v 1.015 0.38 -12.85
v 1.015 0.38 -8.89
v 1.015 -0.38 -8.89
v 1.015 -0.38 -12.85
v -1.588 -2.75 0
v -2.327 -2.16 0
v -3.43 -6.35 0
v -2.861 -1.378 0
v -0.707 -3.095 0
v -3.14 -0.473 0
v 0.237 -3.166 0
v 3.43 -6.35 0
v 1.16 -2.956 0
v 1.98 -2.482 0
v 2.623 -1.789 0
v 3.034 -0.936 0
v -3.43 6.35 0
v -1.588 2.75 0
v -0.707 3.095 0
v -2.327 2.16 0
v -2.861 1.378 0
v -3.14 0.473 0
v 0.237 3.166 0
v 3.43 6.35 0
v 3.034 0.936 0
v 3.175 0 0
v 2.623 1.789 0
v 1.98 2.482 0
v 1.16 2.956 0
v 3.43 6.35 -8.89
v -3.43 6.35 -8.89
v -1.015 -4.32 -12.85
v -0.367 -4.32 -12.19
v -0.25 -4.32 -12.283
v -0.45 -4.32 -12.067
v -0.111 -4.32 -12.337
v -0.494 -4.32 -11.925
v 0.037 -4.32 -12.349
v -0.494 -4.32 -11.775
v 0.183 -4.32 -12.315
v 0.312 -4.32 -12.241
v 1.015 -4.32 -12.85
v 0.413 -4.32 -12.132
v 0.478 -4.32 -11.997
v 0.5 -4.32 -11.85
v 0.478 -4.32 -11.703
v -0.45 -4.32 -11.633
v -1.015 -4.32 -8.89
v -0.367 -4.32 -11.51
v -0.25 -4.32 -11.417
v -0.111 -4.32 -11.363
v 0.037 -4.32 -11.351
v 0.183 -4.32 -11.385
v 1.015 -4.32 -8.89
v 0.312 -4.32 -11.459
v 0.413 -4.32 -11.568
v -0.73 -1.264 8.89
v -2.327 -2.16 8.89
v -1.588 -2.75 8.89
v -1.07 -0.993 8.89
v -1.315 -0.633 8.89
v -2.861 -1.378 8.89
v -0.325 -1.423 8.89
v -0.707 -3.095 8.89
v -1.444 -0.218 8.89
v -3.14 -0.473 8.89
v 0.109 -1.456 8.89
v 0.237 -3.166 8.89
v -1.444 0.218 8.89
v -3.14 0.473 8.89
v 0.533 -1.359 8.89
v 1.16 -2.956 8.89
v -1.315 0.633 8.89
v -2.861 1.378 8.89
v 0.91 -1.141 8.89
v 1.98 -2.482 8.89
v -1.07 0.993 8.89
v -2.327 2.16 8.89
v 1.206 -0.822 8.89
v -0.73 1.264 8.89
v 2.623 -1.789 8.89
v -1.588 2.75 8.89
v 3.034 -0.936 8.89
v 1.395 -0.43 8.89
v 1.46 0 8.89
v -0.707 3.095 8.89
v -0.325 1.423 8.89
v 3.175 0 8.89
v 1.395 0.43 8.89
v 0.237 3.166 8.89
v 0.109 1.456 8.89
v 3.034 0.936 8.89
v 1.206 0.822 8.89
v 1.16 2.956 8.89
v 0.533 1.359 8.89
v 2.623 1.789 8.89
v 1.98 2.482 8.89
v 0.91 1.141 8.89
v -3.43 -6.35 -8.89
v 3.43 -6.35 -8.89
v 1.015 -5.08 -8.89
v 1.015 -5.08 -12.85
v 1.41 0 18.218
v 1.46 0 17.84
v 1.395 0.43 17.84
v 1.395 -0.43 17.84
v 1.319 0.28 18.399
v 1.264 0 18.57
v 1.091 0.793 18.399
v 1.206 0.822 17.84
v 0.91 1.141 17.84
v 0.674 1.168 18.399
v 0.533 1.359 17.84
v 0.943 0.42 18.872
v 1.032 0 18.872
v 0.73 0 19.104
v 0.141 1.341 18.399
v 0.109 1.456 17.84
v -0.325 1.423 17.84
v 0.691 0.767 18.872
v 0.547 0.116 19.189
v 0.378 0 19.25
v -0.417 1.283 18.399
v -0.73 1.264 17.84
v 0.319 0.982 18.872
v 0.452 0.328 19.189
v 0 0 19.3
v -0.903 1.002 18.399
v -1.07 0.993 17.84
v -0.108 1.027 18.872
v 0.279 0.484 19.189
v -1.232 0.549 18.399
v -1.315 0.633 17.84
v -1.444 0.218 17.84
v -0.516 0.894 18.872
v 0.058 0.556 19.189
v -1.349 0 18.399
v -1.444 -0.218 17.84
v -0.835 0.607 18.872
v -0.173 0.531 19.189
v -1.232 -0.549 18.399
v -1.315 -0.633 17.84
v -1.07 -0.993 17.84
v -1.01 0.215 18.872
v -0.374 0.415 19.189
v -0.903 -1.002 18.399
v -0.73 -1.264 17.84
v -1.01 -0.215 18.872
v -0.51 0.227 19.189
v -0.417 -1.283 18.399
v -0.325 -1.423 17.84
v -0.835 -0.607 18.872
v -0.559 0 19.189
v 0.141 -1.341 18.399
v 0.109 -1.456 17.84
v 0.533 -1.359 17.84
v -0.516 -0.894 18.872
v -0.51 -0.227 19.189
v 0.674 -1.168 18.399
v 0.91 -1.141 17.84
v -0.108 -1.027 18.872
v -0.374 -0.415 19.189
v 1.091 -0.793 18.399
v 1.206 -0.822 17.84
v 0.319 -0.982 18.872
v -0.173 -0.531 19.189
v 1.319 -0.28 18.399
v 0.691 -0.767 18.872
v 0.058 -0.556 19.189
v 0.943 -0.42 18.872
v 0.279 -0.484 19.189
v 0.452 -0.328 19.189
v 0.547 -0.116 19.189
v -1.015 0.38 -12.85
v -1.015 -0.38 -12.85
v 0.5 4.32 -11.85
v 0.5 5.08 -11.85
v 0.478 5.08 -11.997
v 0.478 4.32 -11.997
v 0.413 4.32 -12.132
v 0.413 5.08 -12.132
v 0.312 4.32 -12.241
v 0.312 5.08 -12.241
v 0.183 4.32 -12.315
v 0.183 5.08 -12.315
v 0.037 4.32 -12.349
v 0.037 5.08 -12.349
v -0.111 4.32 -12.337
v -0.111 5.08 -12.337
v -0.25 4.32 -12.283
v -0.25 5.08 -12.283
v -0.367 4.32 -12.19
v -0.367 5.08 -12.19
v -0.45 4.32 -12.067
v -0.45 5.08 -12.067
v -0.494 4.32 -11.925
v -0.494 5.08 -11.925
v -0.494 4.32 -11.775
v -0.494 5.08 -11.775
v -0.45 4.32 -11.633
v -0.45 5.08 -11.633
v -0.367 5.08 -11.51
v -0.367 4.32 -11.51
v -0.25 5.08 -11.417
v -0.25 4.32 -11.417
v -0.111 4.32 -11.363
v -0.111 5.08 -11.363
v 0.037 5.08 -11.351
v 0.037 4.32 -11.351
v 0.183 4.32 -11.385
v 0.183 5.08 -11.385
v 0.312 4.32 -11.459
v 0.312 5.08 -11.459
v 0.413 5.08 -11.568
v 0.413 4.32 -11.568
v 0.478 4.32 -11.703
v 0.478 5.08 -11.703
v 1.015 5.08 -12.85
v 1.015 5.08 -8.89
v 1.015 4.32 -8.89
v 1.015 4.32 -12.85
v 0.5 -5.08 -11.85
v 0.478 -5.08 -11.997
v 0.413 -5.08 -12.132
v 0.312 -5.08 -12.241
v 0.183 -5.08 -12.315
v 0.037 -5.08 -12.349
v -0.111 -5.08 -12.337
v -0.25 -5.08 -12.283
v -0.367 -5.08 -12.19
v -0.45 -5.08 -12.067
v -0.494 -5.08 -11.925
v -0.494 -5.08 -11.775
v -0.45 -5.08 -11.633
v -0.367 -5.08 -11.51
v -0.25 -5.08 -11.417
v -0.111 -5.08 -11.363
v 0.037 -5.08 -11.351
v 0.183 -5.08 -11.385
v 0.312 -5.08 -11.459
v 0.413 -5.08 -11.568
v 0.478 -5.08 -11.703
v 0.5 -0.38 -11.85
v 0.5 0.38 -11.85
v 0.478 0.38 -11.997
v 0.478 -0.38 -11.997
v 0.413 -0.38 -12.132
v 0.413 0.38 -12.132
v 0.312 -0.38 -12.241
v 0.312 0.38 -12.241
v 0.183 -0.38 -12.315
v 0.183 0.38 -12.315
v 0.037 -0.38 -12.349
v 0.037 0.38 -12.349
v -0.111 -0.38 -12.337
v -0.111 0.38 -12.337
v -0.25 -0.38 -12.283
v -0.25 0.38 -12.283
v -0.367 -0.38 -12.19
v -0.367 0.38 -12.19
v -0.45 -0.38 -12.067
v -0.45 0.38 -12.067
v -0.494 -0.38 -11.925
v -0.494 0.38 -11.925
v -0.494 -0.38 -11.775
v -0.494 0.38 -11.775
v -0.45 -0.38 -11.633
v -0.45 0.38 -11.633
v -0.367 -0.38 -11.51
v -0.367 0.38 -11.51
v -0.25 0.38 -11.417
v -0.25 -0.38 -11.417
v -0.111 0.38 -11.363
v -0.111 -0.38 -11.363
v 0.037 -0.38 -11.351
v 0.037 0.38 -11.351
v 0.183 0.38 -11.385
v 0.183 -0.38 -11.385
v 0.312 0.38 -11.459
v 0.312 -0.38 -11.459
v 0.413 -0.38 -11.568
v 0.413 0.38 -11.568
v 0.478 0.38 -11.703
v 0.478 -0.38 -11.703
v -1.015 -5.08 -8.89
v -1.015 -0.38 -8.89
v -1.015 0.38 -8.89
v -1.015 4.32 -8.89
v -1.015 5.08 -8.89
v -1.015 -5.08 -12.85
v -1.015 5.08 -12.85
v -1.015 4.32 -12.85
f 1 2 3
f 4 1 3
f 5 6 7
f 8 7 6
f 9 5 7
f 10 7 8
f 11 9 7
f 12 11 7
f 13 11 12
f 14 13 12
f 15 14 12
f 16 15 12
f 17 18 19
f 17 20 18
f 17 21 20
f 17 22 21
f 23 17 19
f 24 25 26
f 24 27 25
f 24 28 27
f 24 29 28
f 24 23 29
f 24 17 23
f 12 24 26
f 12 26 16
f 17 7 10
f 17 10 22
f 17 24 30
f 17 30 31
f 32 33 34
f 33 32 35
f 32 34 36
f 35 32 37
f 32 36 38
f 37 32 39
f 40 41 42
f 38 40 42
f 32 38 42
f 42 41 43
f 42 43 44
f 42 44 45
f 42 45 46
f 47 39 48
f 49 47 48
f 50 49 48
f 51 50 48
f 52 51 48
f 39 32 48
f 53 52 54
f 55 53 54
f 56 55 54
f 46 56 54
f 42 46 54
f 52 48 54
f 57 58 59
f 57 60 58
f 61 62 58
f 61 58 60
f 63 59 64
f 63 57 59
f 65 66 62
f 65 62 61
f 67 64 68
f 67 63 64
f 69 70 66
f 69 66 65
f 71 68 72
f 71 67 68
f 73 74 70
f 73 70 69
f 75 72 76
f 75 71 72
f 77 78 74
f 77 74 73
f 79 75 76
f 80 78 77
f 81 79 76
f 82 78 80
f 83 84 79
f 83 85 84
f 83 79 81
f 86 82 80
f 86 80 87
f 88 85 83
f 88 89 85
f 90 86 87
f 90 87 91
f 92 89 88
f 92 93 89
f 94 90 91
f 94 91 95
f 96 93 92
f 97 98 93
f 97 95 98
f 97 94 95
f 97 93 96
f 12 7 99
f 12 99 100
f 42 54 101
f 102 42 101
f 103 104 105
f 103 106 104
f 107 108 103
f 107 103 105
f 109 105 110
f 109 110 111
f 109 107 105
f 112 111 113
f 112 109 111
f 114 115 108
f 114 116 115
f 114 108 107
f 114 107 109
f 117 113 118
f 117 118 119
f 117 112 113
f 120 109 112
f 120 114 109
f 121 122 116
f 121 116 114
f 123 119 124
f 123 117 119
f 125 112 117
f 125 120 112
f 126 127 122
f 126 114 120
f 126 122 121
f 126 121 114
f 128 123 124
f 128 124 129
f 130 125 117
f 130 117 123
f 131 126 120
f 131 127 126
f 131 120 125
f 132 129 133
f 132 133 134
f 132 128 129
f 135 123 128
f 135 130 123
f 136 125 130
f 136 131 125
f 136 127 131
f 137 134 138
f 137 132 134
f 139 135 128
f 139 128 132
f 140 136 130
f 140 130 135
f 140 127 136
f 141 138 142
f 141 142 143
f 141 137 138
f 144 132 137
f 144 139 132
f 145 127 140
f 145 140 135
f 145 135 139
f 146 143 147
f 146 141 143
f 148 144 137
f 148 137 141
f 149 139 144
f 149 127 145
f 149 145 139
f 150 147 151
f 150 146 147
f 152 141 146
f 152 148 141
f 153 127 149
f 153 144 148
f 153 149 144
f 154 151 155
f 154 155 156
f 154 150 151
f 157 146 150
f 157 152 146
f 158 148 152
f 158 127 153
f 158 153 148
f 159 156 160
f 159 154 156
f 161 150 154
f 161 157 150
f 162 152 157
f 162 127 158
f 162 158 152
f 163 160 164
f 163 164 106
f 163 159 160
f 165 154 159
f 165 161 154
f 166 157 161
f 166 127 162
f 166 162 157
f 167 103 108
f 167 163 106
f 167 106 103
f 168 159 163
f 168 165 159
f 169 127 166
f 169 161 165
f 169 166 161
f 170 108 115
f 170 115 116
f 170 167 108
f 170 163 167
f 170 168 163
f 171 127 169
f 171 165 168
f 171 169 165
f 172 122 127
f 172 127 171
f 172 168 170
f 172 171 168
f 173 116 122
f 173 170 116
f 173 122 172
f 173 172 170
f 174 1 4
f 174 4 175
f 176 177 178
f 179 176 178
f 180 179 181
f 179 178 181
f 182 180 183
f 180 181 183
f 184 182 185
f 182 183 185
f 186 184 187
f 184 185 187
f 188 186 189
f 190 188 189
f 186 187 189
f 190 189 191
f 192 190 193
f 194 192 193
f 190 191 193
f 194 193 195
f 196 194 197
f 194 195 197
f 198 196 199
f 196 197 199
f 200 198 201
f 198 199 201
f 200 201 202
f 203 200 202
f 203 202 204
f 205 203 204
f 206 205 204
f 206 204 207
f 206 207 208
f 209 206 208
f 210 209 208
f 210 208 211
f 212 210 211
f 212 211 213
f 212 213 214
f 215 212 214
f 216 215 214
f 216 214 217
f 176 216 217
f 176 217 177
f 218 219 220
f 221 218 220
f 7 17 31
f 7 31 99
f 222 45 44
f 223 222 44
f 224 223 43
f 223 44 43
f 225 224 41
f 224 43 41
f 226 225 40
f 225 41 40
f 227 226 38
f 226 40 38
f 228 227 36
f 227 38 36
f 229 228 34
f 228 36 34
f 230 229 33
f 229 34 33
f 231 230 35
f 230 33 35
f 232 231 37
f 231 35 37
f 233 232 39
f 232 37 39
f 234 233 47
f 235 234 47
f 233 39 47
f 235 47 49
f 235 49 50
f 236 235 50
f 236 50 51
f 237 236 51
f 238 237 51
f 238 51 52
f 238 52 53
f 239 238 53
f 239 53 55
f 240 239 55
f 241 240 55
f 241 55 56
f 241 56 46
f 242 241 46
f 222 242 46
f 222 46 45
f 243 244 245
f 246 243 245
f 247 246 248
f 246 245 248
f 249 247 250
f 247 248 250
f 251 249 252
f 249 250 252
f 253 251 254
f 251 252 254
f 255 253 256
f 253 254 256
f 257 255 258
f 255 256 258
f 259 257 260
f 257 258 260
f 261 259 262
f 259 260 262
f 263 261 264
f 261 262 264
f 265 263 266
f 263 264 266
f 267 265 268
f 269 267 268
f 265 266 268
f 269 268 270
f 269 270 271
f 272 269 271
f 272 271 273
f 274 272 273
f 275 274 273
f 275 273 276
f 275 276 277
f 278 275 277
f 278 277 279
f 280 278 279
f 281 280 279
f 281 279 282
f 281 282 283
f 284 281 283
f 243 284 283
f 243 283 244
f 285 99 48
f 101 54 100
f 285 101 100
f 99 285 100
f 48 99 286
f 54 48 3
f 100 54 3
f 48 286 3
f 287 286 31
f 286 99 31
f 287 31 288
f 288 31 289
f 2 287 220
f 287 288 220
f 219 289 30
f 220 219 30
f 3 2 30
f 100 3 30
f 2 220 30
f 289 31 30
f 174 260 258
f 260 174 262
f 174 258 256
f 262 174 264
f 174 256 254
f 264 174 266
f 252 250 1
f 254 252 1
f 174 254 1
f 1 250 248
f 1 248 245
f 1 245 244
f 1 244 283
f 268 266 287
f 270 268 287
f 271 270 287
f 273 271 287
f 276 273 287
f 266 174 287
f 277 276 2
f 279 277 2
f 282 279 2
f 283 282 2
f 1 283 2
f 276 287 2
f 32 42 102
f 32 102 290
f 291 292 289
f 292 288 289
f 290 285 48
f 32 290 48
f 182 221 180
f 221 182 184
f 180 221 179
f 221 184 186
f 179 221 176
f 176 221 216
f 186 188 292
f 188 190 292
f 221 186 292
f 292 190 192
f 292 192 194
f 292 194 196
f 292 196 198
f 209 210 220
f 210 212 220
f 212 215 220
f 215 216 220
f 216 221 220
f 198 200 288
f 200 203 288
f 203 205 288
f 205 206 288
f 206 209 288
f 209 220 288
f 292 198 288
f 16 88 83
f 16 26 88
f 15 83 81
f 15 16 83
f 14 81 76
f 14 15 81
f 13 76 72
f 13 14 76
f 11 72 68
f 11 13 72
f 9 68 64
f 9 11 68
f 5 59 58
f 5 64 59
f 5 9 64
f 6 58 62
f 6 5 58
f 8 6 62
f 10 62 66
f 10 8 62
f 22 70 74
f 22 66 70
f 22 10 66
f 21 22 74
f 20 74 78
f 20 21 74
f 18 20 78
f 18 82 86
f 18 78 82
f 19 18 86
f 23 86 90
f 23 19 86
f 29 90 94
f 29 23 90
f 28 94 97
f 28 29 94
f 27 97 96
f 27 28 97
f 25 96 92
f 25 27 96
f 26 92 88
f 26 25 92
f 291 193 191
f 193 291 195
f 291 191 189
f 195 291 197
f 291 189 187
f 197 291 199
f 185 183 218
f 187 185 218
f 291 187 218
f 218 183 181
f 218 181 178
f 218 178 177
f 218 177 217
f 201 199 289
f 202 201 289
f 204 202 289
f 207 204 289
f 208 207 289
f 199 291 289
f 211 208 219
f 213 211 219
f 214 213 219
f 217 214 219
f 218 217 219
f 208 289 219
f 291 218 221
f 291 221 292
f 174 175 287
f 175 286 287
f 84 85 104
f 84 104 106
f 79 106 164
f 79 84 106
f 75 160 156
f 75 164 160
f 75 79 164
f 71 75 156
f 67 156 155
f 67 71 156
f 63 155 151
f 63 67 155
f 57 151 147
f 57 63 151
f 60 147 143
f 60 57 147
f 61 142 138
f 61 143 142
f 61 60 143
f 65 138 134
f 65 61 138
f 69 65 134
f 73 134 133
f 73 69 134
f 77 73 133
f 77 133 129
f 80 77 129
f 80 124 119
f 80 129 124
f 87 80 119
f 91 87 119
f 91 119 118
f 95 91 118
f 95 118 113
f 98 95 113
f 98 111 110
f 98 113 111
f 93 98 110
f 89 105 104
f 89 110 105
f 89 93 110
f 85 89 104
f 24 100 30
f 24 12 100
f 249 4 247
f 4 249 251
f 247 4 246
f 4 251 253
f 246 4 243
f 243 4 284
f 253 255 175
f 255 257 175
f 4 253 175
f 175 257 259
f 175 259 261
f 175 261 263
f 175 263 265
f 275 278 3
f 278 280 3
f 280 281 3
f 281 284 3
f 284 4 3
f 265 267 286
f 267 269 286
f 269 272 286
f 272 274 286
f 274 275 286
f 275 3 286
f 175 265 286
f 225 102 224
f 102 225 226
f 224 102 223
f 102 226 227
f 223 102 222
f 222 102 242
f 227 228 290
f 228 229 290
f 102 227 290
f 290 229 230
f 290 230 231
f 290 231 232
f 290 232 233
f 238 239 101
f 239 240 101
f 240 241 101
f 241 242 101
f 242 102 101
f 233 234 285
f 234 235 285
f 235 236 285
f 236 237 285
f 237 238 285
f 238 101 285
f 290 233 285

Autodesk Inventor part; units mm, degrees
ref_plane "YZ Plane" through (0, 0, 0) normal (1, 0, 0) x (0, 1, 0)
ref_plane "XZ Plane" through (0, 0, 0) normal (0, 1, 0) x (-1, 0, 0)
ref_plane "XY Plane" through (0, 0, 0) normal (0, 0, 1) x (1, 0, 0)
sketch "Sketch1" plane through (0, 0, 0) normal (0, 0, 1) x (1, 0, 0)
  line L0 (-3.43, -6.35) -> (3.43, -6.35)
  line L1 (3.43, -6.35) -> (3.43, 6.35)
  line L2 (3.43, 6.35) -> (-3.43, 6.35)
  line L3 (-3.43, 6.35) -> (-3.43, -6.35)
  line L4 (-3.43, -6.35) -> (3.43, 6.35) construction
  line L5 (3.43, -6.35) -> (-3.43, 6.35) construction
  point P0 (0, 0)
  dimension "d0" = 6.86
  dimension "d1" = 12.7
extrude "Extrusion1" add sketch "Sketch1" against normal blind 8.89
sketch "Sketch2" plane through (0, 0, 0) normal (0, 0, 1) x (1, 0, 0)
  circle A0 centre (0, 0) radius 3.175
  dimension "d35" = 6.35
extrude "Extrusion2" add sketch "Sketch2" along normal blind 8.89
sketch "Sketch3" plane through (0, 0, -8.89) normal (0, 0, -1) x (-1, 0, 0)
  line L0 (-1.015, -0.38) -> (1.015, -0.38)
  line L1 (1.015, -0.38) -> (1.015, 0.38)
  line L2 (1.015, 0.38) -> (-1.015, 0.38)
  line L3 (-1.015, 0.38) -> (-1.015, -0.38)
  line L4 (-1.015, -0.38) -> (1.015, 0.38) construction
  line L5 (1.015, -0.38) -> (-1.015, 0.38) construction
  line L6 (-1.015, -5.08) -> (1.015, -5.08)
  line L7 (1.015, -5.08) -> (1.015, -4.32)
  line L8 (1.015, -4.32) -> (-1.015, -4.32)
  line L9 (-1.015, -4.32) -> (-1.015, -5.08)
  line L10 (-1.015, -5.08) -> (1.015, -4.32) construction
  line L11 (1.015, -5.08) -> (-1.015, -4.32) construction
  line L12 (-1.015, -9.78) -> (1.015, -9.78) construction
  line L13 (1.015, -9.78) -> (1.015, -9.02) construction
  line L14 (1.015, -9.02) -> (-1.015, -9.02) construction
  line L15 (-1.015, -9.02) -> (-1.015, -9.78) construction
  line L16 (-1.015, -9.78) -> (1.015, -9.02) construction
  line L17 (1.015, -9.78) -> (-1.015, -9.02) construction
  line L18 (-1.015, 4.32) -> (1.015, 4.32)
  line L19 (1.015, 4.32) -> (1.015, 5.08)
  line L20 (1.015, 5.08) -> (-1.015, 5.08)
  line L21 (-1.015, 5.08) -> (-1.015, 4.32)
  line L22 (-1.015, 4.32) -> (1.015, 5.08) construction
  line L23 (1.015, 4.32) -> (-1.015, 5.08) construction
  point P0 (0, 0)
  point P1 (0, 4.7)
  dimension "d6" = 2.03
  dimension "d7" = 0.76
  dimension "d10" = 4.7
  dimension "d17" = 4.7
extrude "Extrusion3" add sketch "Sketch3" along normal blind 3.96
sketch "Sketch4" plane through (-1.015, 5.08, -8.89) normal (0, 1, 0) x (1, 0, 0)
  line L0 (2.03, 0) -> (2.03, 3.96) projected
  line L1 (0, 3.96) -> (2.03, 3.96) projected
  circle A0 centre (1.015, 2.96) radius 0.5
  point P0 (1.015, -8.89)
  dimension "d24" = 1
  dimension "d25" = 1
  dimension "d26" = 1.015
extrude "Extrusion4" cut sketch "Sketch4" against normal through all
sketch "Sketch6" plane through (0, 0, 8.89) normal (0, 0, 1) x (1, 0, 0)
  circle A0 centre (0, 0) radius 1.46
  circle A1 centre (0, 0) radius 3.175 projected
  dimension "d29" = 2.92
extrude "Extrusion5" add sketch "Sketch6" along normal blind 10.41 contours A0
fillet "Fillet1" radius 1.46 1 edges at (-1.46, 0, 19.3)
thread "Thread1" size "1/4-20 UNC" class "2A" standard "ANSI Unified Screw Threads" full length
sketch "Sketch7" plane through (-1.015, -5.08, -8.89) normal (0, -1, 0) x (1, 0, 0)
  circle A0 centre (1.015, -2.96) radius 0.5 projected
sketch "Sketch8" plane through (-1.015, -0.38, -8.89) normal (0, -1, 0) x (1, 0, 0)
  circle A0 centre (1.015, -2.96) radius 0.5 projected
sketch "Sketch9" plane through (-1.015, 4.32, -8.89) normal (0, -1, 0) x (1, 0, 0)
  circle A0 centre (1.015, -2.96) radius 0.5 projected
properties part number "1MS2" material "Aluminum"
